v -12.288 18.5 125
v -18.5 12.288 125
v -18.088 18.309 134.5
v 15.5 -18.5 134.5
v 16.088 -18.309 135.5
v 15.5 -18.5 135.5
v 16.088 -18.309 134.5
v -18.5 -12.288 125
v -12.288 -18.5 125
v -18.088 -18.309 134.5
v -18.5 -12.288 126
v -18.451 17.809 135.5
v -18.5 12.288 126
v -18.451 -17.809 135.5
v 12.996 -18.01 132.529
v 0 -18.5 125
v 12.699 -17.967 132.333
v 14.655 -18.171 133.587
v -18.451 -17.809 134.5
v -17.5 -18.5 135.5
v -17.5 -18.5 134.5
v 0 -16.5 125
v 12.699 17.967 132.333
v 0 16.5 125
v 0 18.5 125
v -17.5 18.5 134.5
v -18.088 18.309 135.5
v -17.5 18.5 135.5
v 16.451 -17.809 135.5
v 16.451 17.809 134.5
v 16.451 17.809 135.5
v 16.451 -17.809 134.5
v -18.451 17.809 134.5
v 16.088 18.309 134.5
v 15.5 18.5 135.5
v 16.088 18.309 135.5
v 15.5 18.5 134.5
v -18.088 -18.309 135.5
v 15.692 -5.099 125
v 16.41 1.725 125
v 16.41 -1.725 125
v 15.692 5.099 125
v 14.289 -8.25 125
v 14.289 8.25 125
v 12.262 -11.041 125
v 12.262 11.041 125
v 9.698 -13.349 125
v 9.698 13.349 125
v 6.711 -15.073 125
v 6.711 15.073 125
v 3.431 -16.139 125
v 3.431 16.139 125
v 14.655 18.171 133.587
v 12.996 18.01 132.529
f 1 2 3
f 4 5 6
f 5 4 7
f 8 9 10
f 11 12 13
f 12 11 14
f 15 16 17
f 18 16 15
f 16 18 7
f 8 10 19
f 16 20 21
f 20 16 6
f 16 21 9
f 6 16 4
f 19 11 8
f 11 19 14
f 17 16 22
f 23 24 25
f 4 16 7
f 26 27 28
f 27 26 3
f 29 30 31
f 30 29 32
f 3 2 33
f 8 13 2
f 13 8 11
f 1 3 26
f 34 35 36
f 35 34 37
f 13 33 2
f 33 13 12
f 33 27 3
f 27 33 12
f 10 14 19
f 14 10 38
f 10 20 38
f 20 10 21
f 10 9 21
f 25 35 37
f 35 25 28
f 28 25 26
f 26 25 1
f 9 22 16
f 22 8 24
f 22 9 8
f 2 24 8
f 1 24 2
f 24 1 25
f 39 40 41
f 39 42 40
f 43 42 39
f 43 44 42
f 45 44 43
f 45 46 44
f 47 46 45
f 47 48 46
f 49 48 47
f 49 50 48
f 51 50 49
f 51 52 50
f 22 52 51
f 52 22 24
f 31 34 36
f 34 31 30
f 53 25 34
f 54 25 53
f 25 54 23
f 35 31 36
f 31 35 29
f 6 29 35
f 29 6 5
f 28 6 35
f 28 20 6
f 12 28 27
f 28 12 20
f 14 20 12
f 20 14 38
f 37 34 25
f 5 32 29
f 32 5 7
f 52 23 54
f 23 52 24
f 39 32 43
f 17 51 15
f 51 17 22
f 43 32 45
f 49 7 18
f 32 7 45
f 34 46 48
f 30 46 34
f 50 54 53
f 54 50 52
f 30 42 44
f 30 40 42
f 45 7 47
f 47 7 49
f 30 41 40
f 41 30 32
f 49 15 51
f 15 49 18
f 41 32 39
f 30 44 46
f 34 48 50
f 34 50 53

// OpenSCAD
maxLength = 138;

circleWidth = 3.8;
circleDia = 33;

wallWidth = 2;

lockWidth = 2;
lockHeight = 6;
lockShiftY = 0.6;

handleWidth = 10;

doubleWall = 2 * wallWidth;
cubeMassHeight = (circleDia + doubleWall) / 2;
cubeMassWidth = circleDia + doubleWall;
cubeMassLength = circleWidth + doubleWall;

nOffSegments = floor((maxLength - (handleWidth + doubleWall + 2)) / cubeMassLength);

realLength = nOffSegments * cubeMassLength + doubleWall;

echo("kolecka slot length ", realLength);

module cubeMass() {
    translate([0, (realLength) / 2, 0])
        intersection() {
            translate([0, 0, cubeMassHeight / 2])
                cube([cubeMassWidth, realLength + doubleWall, cubeMassHeight], center = true);

            translate([0, 0, (3 / 4) * cubeMassHeight])
                rotate([0, 45, 0])
                    cube([cubeMassWidth, realLength + doubleWall, cubeMassWidth], center = true);
        }
}

module cylinderMass() {
    translate([0, (realLength + wallWidth) / 2, cubeMassHeight])
        rotate([90, 0, 0])
            cylinder(h = realLength + wallWidth, d = circleDia, center = true);

    translate([0, 0, cubeMassHeight])
        rotate([90, 0, 0])
            cylinder(h = wallWidth, d = 2, center = true, $fn = 20);
}

module koleckaSlot() {
    translate([- cubeMassHeight, 0, wallWidth])
        rotate([90, 0, 90])
            union() {
                cubeMass();
                cylinderMass();
            }
}

module topCap() {
    translate([- cubeMassHeight, 0, realLength + doubleWall])
        rotate([90, 0, 90]) {
            hull() {
                translate([0, .5, 0])
                    intersection() {
                        translate([0, 0, cubeMassHeight / 2])
                            cube([cubeMassWidth, 1, cubeMassHeight], center = true);

                        translate([0, 0, (3 / 4) * cubeMassHeight])
                            rotate([0, 45, 0])
                                cube([cubeMassWidth, 1, cubeMassWidth], center = true);
                    }

                for (x = [- 1, 1]) {
                    for (z = [0, 1]) {
                        translate([x * (cubeMassWidth / 2 - 1), .5 + handleWidth, z * (cubeMassHeight - 2+ circleDia /
                            2) + 1])
                            rotate([90, 0, 0])
                                cylinder(r = 1, h = 1, $fn = 10);
                    }
                }
            }

            hull() {
                translate([0, .5, cubeMassHeight])
                    rotate([90, 0, 0])
                        cylinder(h = 1, d = circleDia, center = true);

                for (x = [- 1, 1]) {
                    for (z = [0, 1]) {
                        translate([x * (cubeMassWidth / 2 - 1), .5 + handleWidth, z * (cubeMassHeight - 2 + circleDia /
                            2) + 1])
                            rotate([90, 0, 0])
                                cylinder(r = 1, h = 1, $fn = 10);
                    }
                }
            }
        }
}

union() {
    //koleckaSlot();
    topCap();
}
